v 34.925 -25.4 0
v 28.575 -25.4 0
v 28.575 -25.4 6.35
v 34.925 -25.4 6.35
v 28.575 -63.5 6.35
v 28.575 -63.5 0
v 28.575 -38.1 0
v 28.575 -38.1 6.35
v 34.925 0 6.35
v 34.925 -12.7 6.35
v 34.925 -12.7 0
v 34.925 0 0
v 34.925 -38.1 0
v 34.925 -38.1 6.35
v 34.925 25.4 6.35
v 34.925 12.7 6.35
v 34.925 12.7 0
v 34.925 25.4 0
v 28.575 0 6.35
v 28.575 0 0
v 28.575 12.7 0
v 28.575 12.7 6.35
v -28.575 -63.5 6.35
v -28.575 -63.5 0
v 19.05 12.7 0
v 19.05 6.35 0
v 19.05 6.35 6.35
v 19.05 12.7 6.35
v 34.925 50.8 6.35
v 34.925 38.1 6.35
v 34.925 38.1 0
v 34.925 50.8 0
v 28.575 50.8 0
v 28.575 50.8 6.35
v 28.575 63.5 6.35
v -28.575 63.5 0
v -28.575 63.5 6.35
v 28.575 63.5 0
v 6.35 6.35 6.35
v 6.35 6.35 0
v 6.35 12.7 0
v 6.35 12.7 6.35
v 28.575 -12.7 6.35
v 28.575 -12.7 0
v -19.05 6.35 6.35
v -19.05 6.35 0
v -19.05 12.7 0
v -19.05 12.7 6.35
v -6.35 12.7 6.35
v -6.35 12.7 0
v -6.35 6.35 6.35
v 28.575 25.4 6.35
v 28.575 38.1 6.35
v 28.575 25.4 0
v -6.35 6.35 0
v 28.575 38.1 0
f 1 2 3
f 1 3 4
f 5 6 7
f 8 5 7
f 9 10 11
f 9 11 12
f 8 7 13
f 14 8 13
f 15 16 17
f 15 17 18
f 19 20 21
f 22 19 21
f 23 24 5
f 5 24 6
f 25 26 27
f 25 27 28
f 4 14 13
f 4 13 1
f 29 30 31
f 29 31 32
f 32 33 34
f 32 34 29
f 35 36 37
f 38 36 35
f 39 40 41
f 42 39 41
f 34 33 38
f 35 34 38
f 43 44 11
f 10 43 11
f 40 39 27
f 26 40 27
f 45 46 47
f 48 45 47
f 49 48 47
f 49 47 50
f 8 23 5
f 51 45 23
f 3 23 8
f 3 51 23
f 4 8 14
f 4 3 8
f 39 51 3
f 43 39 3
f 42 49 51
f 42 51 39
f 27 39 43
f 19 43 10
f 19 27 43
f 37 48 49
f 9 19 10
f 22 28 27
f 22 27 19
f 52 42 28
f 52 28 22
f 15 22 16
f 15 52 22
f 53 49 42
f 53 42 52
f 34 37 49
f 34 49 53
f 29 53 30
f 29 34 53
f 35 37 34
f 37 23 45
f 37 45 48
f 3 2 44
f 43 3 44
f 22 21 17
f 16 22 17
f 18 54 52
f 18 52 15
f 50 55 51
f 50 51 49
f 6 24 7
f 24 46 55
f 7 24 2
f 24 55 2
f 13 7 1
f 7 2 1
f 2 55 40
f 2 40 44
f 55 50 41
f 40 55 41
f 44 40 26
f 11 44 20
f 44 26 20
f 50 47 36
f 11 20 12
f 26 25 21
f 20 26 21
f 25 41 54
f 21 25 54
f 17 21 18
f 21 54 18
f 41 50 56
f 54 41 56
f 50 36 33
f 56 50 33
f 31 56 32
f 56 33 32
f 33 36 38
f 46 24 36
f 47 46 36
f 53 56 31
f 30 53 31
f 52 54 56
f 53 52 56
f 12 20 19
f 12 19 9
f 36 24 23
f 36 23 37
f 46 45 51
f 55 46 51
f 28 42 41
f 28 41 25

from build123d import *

# Parameters (mm, degrees)
ESQUISSE1_W                     = 57.15
ESQUISSE1_H                     = 127
BOSS_EXTRU_1_DEPTH              = 6.35
ESQUISSE2_W                     = 6.35
ESQUISSE2_H                     = 12.7
BOSS_EXTRU_2_DEPTH              = 6.35
R_P_TITION_LIN_AIRE1_COUNT      = 4
R_P_TITION_LIN_AIRE1_PITCH      = 25.4
ESQUISSE3_W                     = 12.7
ESQUISSE3_H                     = 6.35
ENL_V_MAT_EXTRU_1_DEPTH         = 6.35
R_P_TITION_LIN_AIRE2_COUNT      = 2
R_P_TITION_LIN_AIRE2_PITCH      = 25.4
R_P_TITION_LIN_AIRE2_COUNT_DIR2 = 2
R_P_TITION_LIN_AIRE2_PITCH_DIR2 = 57.15


with BuildPart() as part:
    # Esquisse1 → Boss.-Extru.1 (new body)
    with BuildSketch(Plane.XY):
        Rectangle(ESQUISSE1_W, ESQUISSE1_H)
    extrude(amount=BOSS_EXTRU_1_DEPTH)

    # Esquisse2 → Boss.-Extru.2 (add)
    with BuildSketch(Plane.XY.offset(6.35)):
        with Locations((31.75, 44.45)):
            Rectangle(ESQUISSE2_W, ESQUISSE2_H)
    boss_extru_2 = extrude(amount=-BOSS_EXTRU_2_DEPTH)

    # Répétition linéaire1: Boss.-Extru.2 ×4
    with Locations(*[(0, -i * R_P_TITION_LIN_AIRE1_PITCH, 0) for i in range(1, R_P_TITION_LIN_AIRE1_COUNT)]):
        add(boss_extru_2)

    # Esquisse3 → Enlèv. mat.-Extru.1 (cut)
    with BuildSketch(Plane.XY.offset(6.35)):
        with Locations((-12.7, 9.525)):
            Rectangle(ESQUISSE3_W, ESQUISSE3_H)
    enl_v_mat_extru_1 = extrude(amount=-ENL_V_MAT_EXTRU_1_DEPTH, mode=Mode.SUBTRACT)

    # Répétition linéaire2: Enl_v. mat.-Extru.1 2 × 2
    with Locations(*[(i * R_P_TITION_LIN_AIRE2_PITCH, j * R_P_TITION_LIN_AIRE2_PITCH_DIR2, 0) for i in range(R_P_TITION_LIN_AIRE2_COUNT) for j in range(R_P_TITION_LIN_AIRE2_COUNT_DIR2) if (i, j) != (0, 0)]):
        add(enl_v_mat_extru_1, mode=Mode.SUBTRACT)


solid = part.part
